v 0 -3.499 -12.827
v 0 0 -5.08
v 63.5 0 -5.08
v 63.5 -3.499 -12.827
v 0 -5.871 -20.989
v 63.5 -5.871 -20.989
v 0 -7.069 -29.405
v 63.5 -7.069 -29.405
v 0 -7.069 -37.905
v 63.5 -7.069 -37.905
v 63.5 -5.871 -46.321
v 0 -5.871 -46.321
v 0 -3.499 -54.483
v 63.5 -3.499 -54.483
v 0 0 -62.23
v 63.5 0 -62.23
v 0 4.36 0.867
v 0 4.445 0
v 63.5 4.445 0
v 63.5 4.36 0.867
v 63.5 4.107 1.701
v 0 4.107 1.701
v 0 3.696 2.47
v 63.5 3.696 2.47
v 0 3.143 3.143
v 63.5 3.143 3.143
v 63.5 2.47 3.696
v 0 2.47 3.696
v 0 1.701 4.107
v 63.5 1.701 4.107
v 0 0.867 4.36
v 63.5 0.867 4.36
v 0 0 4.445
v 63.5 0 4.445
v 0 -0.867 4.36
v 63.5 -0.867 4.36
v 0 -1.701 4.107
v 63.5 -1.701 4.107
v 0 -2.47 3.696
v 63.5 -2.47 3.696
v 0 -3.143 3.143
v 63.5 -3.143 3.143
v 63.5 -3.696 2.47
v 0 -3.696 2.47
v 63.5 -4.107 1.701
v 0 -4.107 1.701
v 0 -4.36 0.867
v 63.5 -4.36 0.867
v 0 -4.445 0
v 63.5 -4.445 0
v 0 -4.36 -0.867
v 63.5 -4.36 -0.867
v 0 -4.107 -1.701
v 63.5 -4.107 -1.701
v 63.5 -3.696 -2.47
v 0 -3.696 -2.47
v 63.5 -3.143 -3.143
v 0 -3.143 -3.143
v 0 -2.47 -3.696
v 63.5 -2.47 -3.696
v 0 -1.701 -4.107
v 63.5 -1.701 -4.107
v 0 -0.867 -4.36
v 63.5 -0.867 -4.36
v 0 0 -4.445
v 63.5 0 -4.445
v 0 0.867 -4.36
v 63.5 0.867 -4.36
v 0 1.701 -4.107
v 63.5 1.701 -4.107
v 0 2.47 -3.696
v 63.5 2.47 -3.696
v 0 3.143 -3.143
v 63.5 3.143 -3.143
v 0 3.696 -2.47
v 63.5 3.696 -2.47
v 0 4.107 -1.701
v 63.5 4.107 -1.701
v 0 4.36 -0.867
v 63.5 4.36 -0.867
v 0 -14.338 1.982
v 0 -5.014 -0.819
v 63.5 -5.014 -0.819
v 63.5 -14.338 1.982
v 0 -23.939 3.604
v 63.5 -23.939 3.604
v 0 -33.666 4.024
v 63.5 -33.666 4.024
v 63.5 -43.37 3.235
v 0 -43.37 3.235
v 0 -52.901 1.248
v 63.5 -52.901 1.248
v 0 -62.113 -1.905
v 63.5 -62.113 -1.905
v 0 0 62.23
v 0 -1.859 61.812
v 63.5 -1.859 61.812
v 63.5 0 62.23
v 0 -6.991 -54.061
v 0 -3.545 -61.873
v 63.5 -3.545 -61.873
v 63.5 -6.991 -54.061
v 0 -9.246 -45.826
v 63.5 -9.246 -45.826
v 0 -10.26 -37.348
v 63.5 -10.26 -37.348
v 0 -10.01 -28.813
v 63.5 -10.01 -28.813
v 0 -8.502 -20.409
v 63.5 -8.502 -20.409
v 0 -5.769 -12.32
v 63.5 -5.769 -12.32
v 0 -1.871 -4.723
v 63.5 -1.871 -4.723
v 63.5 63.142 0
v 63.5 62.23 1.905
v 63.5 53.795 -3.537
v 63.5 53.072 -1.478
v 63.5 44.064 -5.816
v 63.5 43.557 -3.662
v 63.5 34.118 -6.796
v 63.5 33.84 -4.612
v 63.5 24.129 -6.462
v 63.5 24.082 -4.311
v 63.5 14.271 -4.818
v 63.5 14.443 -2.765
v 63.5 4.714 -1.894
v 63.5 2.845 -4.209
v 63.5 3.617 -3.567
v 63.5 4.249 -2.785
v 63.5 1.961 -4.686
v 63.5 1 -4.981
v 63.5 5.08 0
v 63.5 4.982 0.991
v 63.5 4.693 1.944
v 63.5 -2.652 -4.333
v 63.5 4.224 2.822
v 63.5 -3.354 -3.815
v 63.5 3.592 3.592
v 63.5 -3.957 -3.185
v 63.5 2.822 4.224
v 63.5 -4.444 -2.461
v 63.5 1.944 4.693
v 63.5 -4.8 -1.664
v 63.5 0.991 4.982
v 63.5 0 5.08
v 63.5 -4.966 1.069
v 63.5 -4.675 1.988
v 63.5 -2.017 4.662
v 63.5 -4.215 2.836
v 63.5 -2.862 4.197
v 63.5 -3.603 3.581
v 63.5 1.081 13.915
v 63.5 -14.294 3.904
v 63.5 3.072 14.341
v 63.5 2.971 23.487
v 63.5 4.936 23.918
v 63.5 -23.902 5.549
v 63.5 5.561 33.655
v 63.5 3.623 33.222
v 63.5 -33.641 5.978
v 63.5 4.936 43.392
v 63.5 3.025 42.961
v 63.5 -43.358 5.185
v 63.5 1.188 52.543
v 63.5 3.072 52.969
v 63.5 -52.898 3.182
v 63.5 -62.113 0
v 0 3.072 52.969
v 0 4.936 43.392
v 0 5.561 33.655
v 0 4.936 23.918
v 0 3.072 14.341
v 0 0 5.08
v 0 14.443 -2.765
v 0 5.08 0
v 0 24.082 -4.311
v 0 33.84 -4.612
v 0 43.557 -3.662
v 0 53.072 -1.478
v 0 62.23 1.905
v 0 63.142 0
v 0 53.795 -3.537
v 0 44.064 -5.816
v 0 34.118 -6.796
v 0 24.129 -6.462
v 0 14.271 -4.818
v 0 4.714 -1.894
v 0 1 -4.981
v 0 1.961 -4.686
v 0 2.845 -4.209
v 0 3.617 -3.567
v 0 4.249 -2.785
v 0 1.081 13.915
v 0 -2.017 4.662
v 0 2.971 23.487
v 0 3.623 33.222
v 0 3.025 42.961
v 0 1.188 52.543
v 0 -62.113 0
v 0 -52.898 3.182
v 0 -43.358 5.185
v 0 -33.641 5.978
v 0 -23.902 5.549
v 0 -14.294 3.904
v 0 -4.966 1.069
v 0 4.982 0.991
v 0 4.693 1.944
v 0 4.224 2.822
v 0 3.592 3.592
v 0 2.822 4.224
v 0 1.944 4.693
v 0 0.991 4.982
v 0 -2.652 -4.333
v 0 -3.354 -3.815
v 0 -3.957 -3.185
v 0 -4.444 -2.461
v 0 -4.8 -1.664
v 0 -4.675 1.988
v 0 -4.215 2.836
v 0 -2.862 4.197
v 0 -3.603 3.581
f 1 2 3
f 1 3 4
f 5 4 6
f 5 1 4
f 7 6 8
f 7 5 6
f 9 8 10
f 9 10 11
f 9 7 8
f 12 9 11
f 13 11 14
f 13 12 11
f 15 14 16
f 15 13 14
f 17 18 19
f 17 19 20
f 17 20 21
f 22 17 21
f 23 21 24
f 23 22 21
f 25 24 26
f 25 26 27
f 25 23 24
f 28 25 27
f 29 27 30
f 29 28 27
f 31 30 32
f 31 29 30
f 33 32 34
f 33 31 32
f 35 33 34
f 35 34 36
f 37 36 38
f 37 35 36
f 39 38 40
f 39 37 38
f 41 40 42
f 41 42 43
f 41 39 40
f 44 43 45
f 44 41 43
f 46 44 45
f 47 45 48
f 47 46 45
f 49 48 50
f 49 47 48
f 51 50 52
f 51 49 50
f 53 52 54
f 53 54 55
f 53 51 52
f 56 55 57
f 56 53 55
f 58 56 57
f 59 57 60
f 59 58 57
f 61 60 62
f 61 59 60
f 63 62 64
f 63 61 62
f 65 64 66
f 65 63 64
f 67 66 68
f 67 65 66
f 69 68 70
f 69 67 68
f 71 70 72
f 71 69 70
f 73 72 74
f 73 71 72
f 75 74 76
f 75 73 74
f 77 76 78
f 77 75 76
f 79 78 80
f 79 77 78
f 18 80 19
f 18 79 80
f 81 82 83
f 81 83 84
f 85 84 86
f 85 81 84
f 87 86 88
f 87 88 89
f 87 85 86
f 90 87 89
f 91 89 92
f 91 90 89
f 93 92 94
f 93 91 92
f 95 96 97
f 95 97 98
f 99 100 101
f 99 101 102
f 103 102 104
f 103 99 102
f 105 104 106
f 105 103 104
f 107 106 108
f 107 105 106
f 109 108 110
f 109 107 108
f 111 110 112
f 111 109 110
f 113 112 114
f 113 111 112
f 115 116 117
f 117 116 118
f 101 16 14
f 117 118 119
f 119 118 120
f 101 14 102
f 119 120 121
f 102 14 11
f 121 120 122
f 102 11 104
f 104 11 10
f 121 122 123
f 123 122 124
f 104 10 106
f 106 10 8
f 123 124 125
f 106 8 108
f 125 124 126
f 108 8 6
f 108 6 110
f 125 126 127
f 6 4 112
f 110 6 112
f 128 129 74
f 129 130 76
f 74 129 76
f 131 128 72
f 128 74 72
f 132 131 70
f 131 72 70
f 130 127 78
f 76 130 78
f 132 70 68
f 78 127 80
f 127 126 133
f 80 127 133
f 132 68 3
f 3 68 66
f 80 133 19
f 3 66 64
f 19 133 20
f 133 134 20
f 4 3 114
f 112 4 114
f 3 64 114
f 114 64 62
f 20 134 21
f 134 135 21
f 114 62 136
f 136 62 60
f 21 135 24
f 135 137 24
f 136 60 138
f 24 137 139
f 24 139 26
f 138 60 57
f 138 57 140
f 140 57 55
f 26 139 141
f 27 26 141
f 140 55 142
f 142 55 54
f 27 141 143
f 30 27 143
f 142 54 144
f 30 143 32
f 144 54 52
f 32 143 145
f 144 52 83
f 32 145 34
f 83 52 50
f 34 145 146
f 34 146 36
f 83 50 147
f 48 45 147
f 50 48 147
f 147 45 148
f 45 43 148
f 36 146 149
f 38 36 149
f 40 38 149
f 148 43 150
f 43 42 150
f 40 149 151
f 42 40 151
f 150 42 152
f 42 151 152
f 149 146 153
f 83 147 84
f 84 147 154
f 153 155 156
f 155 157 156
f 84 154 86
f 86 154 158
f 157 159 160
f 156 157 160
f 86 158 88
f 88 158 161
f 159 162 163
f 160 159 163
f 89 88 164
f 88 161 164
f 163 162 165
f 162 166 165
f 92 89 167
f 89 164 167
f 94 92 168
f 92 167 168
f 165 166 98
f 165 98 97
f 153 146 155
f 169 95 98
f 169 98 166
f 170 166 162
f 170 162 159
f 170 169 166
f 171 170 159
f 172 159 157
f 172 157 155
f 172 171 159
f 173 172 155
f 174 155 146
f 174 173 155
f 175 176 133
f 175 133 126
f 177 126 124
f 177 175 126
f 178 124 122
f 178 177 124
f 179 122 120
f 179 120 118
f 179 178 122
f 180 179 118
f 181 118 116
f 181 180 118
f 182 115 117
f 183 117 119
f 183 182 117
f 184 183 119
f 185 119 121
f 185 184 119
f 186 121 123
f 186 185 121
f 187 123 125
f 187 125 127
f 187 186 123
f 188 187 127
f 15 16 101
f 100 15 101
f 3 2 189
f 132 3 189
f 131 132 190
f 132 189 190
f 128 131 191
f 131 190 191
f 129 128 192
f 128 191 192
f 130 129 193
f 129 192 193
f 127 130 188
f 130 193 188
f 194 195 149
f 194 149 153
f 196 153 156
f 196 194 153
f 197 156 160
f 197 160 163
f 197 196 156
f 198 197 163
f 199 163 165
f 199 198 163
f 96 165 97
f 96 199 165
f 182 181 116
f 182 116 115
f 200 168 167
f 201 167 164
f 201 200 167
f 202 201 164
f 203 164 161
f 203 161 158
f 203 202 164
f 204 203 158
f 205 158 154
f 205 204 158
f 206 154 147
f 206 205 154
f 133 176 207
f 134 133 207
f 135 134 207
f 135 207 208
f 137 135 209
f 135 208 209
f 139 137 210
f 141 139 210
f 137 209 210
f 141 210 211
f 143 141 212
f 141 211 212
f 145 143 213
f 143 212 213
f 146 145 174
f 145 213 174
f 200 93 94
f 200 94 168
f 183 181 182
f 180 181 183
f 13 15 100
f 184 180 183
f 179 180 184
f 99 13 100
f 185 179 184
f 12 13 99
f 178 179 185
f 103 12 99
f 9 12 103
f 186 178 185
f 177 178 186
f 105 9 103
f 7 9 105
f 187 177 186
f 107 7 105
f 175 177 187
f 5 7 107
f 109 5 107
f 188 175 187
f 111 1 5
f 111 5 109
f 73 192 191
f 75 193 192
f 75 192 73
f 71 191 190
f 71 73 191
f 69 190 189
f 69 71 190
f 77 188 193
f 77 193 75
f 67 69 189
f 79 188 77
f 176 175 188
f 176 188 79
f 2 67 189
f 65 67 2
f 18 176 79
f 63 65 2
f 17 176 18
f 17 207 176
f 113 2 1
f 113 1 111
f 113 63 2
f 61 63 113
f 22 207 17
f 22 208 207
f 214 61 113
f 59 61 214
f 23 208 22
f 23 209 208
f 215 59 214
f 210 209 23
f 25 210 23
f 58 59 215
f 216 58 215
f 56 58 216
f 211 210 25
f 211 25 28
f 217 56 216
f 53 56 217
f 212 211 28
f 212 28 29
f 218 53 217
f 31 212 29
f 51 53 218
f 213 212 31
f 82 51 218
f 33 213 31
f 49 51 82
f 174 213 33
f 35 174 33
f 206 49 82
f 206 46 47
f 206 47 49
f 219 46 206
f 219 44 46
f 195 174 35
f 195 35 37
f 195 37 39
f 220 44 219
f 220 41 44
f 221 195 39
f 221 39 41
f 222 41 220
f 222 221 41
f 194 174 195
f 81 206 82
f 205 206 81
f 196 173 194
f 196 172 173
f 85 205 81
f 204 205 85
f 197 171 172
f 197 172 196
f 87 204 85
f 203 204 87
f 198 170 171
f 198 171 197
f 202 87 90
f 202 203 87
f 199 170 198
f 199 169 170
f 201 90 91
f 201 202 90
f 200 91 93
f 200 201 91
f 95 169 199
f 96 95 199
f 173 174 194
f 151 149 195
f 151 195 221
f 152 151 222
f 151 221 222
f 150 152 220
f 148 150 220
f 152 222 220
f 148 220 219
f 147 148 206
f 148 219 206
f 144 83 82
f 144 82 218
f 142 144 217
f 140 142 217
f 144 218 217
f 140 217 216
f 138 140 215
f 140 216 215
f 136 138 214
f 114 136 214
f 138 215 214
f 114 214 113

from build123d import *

# Parameters (mm, degrees)
F1_R      = 5.08
F2_DEPTH  = 63.5
F0_R      = 4.445
F3_DEPTH  = 63.5
F5_DEPTH  = 63.5
F7_DEPTH  = 63.5
F8_DEPTH  = 63.5
F9_DEPTH  = 63.5
F10_DEPTH = 63.5
F12_DEPTH = 63.5


with BuildPart() as f2:
    # F1 (on Right) → F2 (new body)
    with BuildSketch(Plane.YZ):
        Circle(F1_R)
    extrude(amount=F2_DEPTH)

    # F0 (on Right) → F3 (cut)
    with BuildSketch(Plane.YZ):
        Circle(F0_R)
    extrude(amount=F3_DEPTH, mode=Mode.SUBTRACT)

    # F4 (on face) → F5 (join)
    with BuildSketch(Plane(origin=(0, 0, 0), x_dir=(0, -1, 0), z_dir=(-1, 0, 0))):
        with BuildLine():
            Line((1.8586593957, 61.8123754669), (0, 62.23))
            ThreePointArc((0, 62.23), (-5.5607094104, 33.655), (0, 5.08))
            Line((0, 5.08), (2.0170907281, 4.6623754669))
            ThreePointArc((2.0170907281, 4.6623754669), (-3.6228573978, 33.2219599945), (1.8586593957, 61.8123754669))
        make_face()
        with BuildLine():
            ThreePointArc((-5.08, 0), (-33.8404680393, -4.6115411802), (-62.23, 1.905))
            Line((-62.23, 1.905), (-63.1423318884, 0))
            ThreePointArc((-63.1423318884, 0), (-34.1176295925, -6.7962114283), (-4.7137119488, -1.8940220863))
            Line((-4.7137119488, -1.8940220863), (-5.08, 0))
        make_face()
    extrude(amount=-F5_DEPTH)

    # F6 (on face) → F7 (join)
    with BuildSketch(Plane(origin=(0, 0, 0), x_dir=(0, -1, 0), z_dir=(-1, 0, 0))):
        with BuildLine():
            Line((0, -62.23), (3.5446478981, -61.8728125))
            ThreePointArc((3.5446478981, -61.8728125), (10.2934213489, -33.0756984809), (1.8712140684, -4.7228125))
            Line((1.8712140684, -4.7228125), (0, -5.08))
            ThreePointArc((0, -5.08), (7.2193443837, -33.655), (0, -62.23))
        make_face()
    extrude(amount=-F7_DEPTH)

    # F4 (on face) → F8 (join)
    with BuildSketch(Plane(origin=(0, 0, 0), x_dir=(0, -1, 0), z_dir=(-1, 0, 0))):
        with BuildLine():
            Line((1.8586593957, 61.8123754669), (0, 62.23))
            ThreePointArc((0, 62.23), (-5.5607094104, 33.655), (0, 5.08))
            Line((0, 5.08), (2.0170907281, 4.6623754669))
            ThreePointArc((2.0170907281, 4.6623754669), (-3.6228573978, 33.2219599945), (1.8586593957, 61.8123754669))
        make_face()
        with BuildLine():
            ThreePointArc((-5.08, 0), (-33.8404680393, -4.6115411802), (-62.23, 1.905))
            Line((-62.23, 1.905), (-63.1423318884, 0))
            ThreePointArc((-63.1423318884, 0), (-34.1176295925, -6.7962114283), (-4.7137119488, -1.8940220863))
            Line((-4.7137119488, -1.8940220863), (-5.08, 0))
        make_face()
    extrude(amount=-F8_DEPTH)

    # F4 (on face) → F9 (join)
    with BuildSketch(Plane(origin=(0, 0, 0), x_dir=(0, -1, 0), z_dir=(-1, 0, 0))):
        with BuildLine():
            Line((1.8586593957, 61.8123754669), (0, 62.23))
            ThreePointArc((0, 62.23), (-5.5607094104, 33.655), (0, 5.08))
            Line((0, 5.08), (2.0170907281, 4.6623754669))
            ThreePointArc((2.0170907281, 4.6623754669), (-3.6228573978, 33.2219599945), (1.8586593957, 61.8123754669))
        make_face()
        with BuildLine():
            ThreePointArc((-5.08, 0), (-33.8404680393, -4.6115411802), (-62.23, 1.905))
            Line((-62.23, 1.905), (-63.1423318884, 0))
            ThreePointArc((-63.1423318884, 0), (-34.1176295925, -6.7962114283), (-4.7137119488, -1.8940220863))
            Line((-4.7137119488, -1.8940220863), (-5.08, 0))
        make_face()
    extrude(amount=-F9_DEPTH)

    # F4 (on face) → F10 (join)
    with BuildSketch(Plane(origin=(0, 0, 0), x_dir=(0, -1, 0), z_dir=(-1, 0, 0))):
        with BuildLine():
            Line((1.8586593957, 61.8123754669), (0, 62.23))
            ThreePointArc((0, 62.23), (-5.5607094104, 33.655), (0, 5.08))
            Line((0, 5.08), (2.0170907281, 4.6623754669))
            ThreePointArc((2.0170907281, 4.6623754669), (-3.6228573978, 33.2219599945), (1.8586593957, 61.8123754669))
        make_face()
        with BuildLine():
            ThreePointArc((-5.08, 0), (-33.8404680393, -4.6115411802), (-62.23, 1.905))
            Line((-62.23, 1.905), (-63.1423318884, 0))
            ThreePointArc((-63.1423318884, 0), (-34.1176295925, -6.7962114283), (-4.7137119488, -1.8940220863))
            Line((-4.7137119488, -1.8940220863), (-5.08, 0))
        make_face()
    extrude(amount=-F10_DEPTH)

    # F11 (on face) → F12 (join)
    with BuildSketch(Plane(origin=(0, 0, 0), x_dir=(0, -1, 0), z_dir=(-1, 0, 0))):
        with BuildLine():
            Line((62.1130176587, -1.905), (62.1130176587, 0))
            ThreePointArc((62.1130176587, 0), (33.6397368663, 5.978196278), (4.9630176587, 1.0677660203))
            Line((4.9630176587, 1.0677660203), (4.9630176587, -0.8372339797))
            ThreePointArc((4.9630176587, -0.8372339797), (33.6388311261, 4.024718381), (62.1130176587, -1.905))
        make_face()
    extrude(amount=-F12_DEPTH)


solid = f2.part
